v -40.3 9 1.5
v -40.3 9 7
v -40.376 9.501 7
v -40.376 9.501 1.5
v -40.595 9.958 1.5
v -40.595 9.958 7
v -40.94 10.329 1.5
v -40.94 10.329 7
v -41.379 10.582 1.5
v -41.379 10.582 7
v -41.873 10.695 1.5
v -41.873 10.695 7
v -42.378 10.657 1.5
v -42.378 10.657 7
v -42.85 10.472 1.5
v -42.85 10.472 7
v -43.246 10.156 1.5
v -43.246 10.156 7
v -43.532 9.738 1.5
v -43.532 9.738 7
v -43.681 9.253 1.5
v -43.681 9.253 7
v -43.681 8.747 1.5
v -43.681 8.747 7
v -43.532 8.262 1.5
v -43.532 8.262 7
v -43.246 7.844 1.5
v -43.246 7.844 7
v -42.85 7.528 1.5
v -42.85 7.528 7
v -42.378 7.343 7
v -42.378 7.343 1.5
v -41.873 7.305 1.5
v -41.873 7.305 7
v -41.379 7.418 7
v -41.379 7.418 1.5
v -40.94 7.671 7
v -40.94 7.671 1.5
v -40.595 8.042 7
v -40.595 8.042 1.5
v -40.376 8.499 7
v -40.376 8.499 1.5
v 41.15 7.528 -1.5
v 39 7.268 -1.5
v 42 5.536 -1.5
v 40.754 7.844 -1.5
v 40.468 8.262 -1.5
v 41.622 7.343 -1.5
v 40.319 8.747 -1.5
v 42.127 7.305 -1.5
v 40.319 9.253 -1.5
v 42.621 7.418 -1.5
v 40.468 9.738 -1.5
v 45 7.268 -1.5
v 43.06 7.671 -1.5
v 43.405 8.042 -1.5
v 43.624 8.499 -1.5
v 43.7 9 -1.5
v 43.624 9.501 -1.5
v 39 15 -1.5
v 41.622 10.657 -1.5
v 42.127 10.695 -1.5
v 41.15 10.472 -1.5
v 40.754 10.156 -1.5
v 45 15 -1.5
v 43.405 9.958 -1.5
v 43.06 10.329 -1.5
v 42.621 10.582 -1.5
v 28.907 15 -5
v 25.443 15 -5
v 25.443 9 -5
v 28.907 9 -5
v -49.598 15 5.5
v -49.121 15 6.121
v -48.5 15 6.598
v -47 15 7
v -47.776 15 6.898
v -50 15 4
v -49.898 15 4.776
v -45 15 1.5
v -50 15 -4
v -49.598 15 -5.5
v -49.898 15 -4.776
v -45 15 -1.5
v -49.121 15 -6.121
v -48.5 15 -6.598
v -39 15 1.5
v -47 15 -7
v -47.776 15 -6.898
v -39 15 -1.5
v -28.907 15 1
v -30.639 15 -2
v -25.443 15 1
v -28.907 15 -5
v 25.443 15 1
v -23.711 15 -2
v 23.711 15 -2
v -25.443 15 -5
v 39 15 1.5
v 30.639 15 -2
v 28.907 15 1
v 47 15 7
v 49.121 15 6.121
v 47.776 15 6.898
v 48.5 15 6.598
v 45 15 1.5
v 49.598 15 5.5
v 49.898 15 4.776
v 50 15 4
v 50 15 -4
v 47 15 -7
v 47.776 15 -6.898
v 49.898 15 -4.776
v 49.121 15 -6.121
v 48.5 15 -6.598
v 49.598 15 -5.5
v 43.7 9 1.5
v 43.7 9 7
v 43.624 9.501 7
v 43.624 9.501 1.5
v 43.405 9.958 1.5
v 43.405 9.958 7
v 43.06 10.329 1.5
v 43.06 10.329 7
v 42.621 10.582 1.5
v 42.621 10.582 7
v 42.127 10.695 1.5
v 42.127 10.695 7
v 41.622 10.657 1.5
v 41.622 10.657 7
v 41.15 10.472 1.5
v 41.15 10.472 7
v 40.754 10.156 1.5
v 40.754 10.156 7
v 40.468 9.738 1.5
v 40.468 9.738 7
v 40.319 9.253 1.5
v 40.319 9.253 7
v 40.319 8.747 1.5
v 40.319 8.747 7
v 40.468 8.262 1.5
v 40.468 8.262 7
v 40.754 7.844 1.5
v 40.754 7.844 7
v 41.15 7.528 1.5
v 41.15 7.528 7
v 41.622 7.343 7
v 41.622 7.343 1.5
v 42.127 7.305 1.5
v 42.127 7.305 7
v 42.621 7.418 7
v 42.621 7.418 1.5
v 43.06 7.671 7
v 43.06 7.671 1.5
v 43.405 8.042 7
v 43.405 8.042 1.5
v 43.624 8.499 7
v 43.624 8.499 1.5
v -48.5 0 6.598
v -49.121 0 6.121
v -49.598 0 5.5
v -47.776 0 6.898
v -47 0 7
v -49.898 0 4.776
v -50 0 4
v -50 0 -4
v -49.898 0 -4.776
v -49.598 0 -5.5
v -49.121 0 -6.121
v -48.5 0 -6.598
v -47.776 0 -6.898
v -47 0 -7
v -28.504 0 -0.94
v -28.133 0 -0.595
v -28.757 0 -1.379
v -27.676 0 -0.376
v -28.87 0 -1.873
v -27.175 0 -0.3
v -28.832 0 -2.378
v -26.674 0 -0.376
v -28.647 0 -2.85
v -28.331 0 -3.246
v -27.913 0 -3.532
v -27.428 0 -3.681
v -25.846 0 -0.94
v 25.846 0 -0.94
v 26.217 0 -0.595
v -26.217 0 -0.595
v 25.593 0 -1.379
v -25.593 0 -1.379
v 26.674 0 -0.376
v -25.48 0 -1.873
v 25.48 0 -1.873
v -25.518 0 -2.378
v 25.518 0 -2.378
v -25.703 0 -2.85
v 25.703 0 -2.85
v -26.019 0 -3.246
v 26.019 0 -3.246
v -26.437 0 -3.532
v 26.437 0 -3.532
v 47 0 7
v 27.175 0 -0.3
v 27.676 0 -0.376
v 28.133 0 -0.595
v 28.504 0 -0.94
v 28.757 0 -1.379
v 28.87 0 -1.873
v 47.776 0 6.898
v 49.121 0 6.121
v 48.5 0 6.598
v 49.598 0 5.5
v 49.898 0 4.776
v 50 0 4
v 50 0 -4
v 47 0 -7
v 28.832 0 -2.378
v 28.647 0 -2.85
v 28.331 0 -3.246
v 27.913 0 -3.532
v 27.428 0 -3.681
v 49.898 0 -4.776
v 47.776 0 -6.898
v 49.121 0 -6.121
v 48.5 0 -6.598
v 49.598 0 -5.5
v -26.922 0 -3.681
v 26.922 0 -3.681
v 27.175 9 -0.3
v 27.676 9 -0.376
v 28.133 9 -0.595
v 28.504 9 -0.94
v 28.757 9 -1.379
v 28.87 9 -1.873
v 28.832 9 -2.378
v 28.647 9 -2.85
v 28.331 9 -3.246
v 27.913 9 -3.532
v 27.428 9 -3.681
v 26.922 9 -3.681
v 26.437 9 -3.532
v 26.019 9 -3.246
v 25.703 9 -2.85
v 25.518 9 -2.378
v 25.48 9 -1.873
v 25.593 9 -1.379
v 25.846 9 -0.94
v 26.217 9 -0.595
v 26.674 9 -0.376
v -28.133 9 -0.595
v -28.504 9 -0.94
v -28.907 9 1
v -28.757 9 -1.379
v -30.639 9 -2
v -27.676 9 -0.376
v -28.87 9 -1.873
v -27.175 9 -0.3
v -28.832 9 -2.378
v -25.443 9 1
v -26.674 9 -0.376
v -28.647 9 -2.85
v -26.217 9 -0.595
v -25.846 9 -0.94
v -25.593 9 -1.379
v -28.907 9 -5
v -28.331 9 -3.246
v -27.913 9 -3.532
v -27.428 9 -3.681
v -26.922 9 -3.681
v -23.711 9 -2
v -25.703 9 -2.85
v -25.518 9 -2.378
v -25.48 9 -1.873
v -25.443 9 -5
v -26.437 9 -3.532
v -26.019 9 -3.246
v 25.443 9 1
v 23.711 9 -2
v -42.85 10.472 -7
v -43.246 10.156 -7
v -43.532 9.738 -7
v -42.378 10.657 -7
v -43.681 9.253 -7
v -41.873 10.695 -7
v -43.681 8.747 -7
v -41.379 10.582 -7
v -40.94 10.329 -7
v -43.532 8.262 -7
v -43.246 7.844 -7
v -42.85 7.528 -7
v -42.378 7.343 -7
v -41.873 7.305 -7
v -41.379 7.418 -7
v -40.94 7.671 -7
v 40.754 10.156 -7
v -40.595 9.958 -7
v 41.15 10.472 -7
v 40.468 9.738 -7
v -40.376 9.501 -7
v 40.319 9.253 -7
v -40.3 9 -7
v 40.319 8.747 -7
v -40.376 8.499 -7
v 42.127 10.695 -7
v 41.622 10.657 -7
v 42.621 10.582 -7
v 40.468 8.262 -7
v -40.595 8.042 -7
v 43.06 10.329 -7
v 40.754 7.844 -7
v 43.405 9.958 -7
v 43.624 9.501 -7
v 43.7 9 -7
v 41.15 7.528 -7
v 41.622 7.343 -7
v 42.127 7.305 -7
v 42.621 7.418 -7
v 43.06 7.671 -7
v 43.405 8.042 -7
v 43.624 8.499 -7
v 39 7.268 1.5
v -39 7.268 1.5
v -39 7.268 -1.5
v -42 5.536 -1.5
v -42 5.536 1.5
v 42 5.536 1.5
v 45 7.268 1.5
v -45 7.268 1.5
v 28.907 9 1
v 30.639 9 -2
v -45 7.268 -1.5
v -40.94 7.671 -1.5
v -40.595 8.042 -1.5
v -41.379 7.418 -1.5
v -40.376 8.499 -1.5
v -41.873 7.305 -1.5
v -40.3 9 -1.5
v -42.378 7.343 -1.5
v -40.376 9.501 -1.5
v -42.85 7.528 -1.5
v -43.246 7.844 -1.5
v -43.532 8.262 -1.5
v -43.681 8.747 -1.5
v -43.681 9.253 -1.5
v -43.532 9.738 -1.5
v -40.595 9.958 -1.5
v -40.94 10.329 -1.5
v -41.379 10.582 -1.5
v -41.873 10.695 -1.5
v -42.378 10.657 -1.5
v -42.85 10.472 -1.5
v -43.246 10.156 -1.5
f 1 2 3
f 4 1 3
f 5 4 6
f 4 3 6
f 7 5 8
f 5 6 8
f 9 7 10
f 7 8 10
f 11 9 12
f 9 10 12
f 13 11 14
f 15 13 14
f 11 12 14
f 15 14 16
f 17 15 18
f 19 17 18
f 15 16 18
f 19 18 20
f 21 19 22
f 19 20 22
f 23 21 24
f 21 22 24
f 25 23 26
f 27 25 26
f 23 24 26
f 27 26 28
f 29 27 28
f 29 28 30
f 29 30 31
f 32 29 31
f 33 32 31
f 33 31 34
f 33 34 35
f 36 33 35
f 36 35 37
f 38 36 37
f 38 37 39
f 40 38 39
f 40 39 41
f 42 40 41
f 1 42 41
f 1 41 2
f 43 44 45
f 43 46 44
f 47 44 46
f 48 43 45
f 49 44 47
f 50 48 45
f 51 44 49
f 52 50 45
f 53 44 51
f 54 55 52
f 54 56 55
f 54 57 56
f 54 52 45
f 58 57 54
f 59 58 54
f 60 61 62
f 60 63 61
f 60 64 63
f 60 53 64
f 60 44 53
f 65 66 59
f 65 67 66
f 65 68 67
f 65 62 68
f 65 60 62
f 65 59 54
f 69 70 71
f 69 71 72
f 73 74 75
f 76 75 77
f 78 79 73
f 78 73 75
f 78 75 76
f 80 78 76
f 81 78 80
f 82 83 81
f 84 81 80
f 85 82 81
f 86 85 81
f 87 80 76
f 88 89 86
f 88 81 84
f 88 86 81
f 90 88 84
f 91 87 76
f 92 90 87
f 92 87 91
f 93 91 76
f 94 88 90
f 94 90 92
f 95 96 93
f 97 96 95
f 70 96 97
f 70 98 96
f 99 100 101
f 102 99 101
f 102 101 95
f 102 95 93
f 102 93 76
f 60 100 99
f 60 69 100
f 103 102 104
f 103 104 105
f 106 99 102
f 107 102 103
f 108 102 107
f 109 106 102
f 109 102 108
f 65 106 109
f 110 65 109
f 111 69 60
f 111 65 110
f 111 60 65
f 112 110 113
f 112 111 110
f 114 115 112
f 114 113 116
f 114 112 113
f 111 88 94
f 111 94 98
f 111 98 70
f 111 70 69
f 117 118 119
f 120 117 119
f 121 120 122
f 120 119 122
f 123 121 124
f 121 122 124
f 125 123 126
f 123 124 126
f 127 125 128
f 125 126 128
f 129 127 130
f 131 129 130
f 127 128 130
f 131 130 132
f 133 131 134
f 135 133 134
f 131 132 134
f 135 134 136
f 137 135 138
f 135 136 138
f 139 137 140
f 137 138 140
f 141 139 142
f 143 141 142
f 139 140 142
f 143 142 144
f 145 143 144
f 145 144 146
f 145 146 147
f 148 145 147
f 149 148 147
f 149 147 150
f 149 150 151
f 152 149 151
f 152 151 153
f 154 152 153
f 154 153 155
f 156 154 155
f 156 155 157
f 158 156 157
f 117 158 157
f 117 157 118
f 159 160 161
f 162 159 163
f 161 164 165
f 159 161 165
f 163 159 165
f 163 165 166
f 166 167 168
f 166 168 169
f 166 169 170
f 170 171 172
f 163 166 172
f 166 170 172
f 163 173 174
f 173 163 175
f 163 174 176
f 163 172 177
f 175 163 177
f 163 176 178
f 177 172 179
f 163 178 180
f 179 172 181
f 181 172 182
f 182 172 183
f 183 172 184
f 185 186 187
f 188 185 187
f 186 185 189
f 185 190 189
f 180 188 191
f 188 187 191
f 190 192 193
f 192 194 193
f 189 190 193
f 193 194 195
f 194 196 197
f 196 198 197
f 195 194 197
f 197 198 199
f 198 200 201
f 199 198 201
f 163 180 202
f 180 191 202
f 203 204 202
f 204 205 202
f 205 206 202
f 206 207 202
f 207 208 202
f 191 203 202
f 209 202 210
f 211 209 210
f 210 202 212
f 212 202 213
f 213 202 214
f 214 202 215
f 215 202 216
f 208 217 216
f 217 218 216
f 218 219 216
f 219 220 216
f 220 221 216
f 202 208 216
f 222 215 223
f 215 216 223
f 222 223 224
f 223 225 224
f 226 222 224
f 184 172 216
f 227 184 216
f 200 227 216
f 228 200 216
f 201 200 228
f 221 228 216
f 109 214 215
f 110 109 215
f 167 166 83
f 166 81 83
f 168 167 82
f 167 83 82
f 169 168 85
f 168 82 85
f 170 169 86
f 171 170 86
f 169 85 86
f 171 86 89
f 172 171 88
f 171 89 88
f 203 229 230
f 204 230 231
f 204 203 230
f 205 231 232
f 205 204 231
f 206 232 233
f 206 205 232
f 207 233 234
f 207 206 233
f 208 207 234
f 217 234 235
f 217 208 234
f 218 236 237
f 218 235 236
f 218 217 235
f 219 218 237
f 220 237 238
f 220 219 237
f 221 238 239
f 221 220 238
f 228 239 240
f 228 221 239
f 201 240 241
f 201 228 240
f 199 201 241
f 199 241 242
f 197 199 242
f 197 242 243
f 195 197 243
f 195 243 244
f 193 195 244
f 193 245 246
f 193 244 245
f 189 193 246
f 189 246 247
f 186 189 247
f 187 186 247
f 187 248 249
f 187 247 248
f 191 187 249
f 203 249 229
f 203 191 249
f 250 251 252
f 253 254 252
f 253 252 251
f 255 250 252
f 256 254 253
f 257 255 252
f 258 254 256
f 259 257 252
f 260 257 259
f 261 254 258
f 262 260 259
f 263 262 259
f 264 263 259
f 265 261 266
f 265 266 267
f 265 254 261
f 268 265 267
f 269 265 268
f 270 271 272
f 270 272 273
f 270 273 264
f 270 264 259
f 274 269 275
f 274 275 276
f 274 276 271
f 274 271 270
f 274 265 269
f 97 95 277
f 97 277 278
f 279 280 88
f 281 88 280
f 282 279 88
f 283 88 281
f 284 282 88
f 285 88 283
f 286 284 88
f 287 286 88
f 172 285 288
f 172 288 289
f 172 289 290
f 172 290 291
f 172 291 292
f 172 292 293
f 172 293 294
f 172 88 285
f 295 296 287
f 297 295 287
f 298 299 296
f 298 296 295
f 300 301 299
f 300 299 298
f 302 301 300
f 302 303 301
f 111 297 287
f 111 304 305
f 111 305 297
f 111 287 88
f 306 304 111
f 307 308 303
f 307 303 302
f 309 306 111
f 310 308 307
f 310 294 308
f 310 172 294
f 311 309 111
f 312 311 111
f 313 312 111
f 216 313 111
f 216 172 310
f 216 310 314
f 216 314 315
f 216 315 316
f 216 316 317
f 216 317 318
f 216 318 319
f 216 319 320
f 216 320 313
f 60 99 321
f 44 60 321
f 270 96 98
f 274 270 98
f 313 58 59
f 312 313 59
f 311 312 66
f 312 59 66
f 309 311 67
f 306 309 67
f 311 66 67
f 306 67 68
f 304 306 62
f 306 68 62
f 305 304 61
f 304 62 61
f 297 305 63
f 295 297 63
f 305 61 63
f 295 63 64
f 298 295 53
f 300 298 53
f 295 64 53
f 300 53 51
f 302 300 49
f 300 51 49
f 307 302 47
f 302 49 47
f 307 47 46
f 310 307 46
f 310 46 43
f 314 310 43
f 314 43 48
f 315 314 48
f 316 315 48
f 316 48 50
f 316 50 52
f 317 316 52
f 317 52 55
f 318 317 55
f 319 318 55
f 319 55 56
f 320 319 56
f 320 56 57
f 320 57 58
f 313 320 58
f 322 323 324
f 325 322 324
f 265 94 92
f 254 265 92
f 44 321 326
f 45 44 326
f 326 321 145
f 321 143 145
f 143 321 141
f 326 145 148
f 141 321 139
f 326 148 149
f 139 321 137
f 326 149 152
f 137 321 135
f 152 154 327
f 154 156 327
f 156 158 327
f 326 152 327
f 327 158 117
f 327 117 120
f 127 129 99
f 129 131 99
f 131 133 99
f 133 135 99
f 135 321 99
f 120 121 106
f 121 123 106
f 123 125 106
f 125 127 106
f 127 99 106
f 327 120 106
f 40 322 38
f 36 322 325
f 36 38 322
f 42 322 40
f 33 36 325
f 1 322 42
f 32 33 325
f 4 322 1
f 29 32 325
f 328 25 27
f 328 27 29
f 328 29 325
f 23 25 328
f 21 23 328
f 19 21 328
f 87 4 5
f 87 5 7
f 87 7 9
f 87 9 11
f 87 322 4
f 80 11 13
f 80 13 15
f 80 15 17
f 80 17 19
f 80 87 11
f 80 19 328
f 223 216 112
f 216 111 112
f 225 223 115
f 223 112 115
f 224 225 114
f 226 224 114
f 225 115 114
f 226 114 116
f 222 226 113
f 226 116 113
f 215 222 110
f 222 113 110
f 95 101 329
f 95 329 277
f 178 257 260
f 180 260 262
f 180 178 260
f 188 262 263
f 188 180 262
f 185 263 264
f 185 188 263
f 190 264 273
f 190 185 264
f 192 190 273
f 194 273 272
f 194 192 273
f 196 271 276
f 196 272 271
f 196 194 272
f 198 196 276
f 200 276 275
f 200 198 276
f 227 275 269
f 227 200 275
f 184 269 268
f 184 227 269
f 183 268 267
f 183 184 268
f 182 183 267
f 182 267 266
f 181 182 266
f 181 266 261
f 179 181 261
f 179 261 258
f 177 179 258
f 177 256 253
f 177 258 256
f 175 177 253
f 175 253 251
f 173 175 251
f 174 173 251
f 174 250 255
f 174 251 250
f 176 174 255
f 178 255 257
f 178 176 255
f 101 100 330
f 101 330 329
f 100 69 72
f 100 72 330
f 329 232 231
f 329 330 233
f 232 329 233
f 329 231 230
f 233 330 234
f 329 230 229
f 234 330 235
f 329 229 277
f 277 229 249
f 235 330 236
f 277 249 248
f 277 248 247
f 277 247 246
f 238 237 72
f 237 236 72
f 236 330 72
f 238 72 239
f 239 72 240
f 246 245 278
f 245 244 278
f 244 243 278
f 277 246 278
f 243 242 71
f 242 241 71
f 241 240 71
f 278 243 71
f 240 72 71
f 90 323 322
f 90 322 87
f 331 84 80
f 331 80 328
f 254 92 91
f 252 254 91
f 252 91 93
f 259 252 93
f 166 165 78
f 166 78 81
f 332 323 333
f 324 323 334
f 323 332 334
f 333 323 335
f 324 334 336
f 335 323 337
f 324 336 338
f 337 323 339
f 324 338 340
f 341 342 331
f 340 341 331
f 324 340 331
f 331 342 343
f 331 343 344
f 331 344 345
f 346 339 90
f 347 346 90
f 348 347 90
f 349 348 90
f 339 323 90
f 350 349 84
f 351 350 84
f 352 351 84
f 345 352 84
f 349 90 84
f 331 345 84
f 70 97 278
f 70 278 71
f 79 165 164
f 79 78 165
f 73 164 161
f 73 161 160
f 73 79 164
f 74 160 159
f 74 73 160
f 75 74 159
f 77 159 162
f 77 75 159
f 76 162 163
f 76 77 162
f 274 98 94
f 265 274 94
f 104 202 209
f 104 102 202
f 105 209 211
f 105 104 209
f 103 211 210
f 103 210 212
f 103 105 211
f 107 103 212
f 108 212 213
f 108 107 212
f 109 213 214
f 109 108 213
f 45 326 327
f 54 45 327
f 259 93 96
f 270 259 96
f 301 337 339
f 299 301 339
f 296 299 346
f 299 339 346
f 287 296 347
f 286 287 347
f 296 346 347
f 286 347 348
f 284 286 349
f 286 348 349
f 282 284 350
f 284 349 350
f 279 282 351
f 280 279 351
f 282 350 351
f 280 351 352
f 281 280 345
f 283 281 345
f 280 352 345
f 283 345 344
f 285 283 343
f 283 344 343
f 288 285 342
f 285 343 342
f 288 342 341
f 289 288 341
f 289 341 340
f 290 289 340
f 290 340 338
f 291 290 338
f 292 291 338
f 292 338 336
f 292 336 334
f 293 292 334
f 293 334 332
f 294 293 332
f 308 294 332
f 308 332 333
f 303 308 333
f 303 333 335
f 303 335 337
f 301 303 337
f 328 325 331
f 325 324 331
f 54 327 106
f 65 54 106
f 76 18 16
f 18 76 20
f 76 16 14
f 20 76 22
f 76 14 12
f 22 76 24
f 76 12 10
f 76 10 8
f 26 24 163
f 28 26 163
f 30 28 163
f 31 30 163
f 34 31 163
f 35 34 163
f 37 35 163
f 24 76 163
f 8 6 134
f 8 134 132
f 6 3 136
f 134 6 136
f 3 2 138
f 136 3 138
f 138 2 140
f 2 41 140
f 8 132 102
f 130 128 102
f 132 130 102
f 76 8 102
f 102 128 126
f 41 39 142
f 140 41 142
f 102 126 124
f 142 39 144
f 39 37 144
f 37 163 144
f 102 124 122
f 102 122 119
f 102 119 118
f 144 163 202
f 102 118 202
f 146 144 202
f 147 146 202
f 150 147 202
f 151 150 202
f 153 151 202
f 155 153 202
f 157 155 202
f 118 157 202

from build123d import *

# Parameters (mm, degrees)
SKETCH1_W           = 100
SKETCH1_H           = 14
SKETCH1_R           = 1.7
BOSS_EXTRUDE1_DEPTH = 15
SKETCH3_R           = 1.7
CUT_EXTRUDE2_DEPTH  = 55.046276467
CUT_EXTRUDE3_START  = -7
CUT_EXTRUDE3_DEPTH  = 1.5
CUT_EXTRUDE4_DEPTH  = 6
FILLET4_R           = 3


with BuildPart() as part:
    # Sketch1 → Boss-Extrude1 (new body)
    with BuildSketch(Plane(origin=(0, 0, 0), x_dir=(1, 0, 0), z_dir=(0, 1, 0))):
        Rectangle(SKETCH1_W, SKETCH1_H)
        with Locations(Location((-27.175, 2, 0), (0, 0, 270))):
            Circle(SKETCH1_R, mode=Mode.SUBTRACT)
        with Locations(Location((27.175, 2, 0), (0, 0, 270))):
            Circle(SKETCH1_R, mode=Mode.SUBTRACT)
    extrude(amount=BOSS_EXTRUDE1_DEPTH)

    # Sketch3 → Cut-Extrude2 (cut, through all)
    with BuildSketch(Plane.XY.offset(7)):
        with Locations((-42, 9)):
            Circle(SKETCH3_R)
        with Locations((42, 9)):
            Circle(SKETCH3_R)
    extrude(amount=-CUT_EXTRUDE2_DEPTH, mode=Mode.SUBTRACT)

    # Sketch4 → Cut-Extrude3 (cut, symmetric)
    with BuildSketch(Plane.XY.offset(7).offset(CUT_EXTRUDE3_START)):
        Polygon((-45, 10.732050808), (-45, 16.451909609), (-39, 16.451909609), (-39, 10.732050808), (-39, 7.267949192), (-42, 5.535898385), (-45, 7.267949192), align=None)
        Polygon((39, 16.451909609), (39, 10.732050808), (39, 7.267949192), (42, 5.535898385), (45, 7.267949192), (45, 10.732050808), (45, 16.451909609), align=None)
    extrude(amount=CUT_EXTRUDE3_DEPTH, both=True, mode=Mode.SUBTRACT)

    # Sketch5 → Cut-Extrude4 (cut)
    with BuildSketch(Plane(origin=(0, 15, 0), x_dir=(1, 0, 0), z_dir=(0, 1, 0))):
        Polygon((-23.710898385, 2), (-25.442949192, 5), (-28.907050808, 5), (-30.639101615, 2), (-28.907050808, -1), (-25.442949192, -1), align=None)
        Polygon((25.442949192, -1), (23.710898385, 2), (25.442949192, 5), (28.907050808, 5), (30.639101615, 2), (28.907050808, -1), align=None)
    extrude(amount=-CUT_EXTRUDE4_DEPTH, mode=Mode.SUBTRACT)

    # Fillet4
    fillet4_edges = [part.edges().sort_by_distance(p)[0] for p in [
        (50, 7.5, 7),
        (-50, 7.5, 7),
        (-50, 7.5, -7),
        (50, 7.5, -7),
    ]]
    fillet(fillet4_edges, radius=FILLET4_R)


solid = part.part
